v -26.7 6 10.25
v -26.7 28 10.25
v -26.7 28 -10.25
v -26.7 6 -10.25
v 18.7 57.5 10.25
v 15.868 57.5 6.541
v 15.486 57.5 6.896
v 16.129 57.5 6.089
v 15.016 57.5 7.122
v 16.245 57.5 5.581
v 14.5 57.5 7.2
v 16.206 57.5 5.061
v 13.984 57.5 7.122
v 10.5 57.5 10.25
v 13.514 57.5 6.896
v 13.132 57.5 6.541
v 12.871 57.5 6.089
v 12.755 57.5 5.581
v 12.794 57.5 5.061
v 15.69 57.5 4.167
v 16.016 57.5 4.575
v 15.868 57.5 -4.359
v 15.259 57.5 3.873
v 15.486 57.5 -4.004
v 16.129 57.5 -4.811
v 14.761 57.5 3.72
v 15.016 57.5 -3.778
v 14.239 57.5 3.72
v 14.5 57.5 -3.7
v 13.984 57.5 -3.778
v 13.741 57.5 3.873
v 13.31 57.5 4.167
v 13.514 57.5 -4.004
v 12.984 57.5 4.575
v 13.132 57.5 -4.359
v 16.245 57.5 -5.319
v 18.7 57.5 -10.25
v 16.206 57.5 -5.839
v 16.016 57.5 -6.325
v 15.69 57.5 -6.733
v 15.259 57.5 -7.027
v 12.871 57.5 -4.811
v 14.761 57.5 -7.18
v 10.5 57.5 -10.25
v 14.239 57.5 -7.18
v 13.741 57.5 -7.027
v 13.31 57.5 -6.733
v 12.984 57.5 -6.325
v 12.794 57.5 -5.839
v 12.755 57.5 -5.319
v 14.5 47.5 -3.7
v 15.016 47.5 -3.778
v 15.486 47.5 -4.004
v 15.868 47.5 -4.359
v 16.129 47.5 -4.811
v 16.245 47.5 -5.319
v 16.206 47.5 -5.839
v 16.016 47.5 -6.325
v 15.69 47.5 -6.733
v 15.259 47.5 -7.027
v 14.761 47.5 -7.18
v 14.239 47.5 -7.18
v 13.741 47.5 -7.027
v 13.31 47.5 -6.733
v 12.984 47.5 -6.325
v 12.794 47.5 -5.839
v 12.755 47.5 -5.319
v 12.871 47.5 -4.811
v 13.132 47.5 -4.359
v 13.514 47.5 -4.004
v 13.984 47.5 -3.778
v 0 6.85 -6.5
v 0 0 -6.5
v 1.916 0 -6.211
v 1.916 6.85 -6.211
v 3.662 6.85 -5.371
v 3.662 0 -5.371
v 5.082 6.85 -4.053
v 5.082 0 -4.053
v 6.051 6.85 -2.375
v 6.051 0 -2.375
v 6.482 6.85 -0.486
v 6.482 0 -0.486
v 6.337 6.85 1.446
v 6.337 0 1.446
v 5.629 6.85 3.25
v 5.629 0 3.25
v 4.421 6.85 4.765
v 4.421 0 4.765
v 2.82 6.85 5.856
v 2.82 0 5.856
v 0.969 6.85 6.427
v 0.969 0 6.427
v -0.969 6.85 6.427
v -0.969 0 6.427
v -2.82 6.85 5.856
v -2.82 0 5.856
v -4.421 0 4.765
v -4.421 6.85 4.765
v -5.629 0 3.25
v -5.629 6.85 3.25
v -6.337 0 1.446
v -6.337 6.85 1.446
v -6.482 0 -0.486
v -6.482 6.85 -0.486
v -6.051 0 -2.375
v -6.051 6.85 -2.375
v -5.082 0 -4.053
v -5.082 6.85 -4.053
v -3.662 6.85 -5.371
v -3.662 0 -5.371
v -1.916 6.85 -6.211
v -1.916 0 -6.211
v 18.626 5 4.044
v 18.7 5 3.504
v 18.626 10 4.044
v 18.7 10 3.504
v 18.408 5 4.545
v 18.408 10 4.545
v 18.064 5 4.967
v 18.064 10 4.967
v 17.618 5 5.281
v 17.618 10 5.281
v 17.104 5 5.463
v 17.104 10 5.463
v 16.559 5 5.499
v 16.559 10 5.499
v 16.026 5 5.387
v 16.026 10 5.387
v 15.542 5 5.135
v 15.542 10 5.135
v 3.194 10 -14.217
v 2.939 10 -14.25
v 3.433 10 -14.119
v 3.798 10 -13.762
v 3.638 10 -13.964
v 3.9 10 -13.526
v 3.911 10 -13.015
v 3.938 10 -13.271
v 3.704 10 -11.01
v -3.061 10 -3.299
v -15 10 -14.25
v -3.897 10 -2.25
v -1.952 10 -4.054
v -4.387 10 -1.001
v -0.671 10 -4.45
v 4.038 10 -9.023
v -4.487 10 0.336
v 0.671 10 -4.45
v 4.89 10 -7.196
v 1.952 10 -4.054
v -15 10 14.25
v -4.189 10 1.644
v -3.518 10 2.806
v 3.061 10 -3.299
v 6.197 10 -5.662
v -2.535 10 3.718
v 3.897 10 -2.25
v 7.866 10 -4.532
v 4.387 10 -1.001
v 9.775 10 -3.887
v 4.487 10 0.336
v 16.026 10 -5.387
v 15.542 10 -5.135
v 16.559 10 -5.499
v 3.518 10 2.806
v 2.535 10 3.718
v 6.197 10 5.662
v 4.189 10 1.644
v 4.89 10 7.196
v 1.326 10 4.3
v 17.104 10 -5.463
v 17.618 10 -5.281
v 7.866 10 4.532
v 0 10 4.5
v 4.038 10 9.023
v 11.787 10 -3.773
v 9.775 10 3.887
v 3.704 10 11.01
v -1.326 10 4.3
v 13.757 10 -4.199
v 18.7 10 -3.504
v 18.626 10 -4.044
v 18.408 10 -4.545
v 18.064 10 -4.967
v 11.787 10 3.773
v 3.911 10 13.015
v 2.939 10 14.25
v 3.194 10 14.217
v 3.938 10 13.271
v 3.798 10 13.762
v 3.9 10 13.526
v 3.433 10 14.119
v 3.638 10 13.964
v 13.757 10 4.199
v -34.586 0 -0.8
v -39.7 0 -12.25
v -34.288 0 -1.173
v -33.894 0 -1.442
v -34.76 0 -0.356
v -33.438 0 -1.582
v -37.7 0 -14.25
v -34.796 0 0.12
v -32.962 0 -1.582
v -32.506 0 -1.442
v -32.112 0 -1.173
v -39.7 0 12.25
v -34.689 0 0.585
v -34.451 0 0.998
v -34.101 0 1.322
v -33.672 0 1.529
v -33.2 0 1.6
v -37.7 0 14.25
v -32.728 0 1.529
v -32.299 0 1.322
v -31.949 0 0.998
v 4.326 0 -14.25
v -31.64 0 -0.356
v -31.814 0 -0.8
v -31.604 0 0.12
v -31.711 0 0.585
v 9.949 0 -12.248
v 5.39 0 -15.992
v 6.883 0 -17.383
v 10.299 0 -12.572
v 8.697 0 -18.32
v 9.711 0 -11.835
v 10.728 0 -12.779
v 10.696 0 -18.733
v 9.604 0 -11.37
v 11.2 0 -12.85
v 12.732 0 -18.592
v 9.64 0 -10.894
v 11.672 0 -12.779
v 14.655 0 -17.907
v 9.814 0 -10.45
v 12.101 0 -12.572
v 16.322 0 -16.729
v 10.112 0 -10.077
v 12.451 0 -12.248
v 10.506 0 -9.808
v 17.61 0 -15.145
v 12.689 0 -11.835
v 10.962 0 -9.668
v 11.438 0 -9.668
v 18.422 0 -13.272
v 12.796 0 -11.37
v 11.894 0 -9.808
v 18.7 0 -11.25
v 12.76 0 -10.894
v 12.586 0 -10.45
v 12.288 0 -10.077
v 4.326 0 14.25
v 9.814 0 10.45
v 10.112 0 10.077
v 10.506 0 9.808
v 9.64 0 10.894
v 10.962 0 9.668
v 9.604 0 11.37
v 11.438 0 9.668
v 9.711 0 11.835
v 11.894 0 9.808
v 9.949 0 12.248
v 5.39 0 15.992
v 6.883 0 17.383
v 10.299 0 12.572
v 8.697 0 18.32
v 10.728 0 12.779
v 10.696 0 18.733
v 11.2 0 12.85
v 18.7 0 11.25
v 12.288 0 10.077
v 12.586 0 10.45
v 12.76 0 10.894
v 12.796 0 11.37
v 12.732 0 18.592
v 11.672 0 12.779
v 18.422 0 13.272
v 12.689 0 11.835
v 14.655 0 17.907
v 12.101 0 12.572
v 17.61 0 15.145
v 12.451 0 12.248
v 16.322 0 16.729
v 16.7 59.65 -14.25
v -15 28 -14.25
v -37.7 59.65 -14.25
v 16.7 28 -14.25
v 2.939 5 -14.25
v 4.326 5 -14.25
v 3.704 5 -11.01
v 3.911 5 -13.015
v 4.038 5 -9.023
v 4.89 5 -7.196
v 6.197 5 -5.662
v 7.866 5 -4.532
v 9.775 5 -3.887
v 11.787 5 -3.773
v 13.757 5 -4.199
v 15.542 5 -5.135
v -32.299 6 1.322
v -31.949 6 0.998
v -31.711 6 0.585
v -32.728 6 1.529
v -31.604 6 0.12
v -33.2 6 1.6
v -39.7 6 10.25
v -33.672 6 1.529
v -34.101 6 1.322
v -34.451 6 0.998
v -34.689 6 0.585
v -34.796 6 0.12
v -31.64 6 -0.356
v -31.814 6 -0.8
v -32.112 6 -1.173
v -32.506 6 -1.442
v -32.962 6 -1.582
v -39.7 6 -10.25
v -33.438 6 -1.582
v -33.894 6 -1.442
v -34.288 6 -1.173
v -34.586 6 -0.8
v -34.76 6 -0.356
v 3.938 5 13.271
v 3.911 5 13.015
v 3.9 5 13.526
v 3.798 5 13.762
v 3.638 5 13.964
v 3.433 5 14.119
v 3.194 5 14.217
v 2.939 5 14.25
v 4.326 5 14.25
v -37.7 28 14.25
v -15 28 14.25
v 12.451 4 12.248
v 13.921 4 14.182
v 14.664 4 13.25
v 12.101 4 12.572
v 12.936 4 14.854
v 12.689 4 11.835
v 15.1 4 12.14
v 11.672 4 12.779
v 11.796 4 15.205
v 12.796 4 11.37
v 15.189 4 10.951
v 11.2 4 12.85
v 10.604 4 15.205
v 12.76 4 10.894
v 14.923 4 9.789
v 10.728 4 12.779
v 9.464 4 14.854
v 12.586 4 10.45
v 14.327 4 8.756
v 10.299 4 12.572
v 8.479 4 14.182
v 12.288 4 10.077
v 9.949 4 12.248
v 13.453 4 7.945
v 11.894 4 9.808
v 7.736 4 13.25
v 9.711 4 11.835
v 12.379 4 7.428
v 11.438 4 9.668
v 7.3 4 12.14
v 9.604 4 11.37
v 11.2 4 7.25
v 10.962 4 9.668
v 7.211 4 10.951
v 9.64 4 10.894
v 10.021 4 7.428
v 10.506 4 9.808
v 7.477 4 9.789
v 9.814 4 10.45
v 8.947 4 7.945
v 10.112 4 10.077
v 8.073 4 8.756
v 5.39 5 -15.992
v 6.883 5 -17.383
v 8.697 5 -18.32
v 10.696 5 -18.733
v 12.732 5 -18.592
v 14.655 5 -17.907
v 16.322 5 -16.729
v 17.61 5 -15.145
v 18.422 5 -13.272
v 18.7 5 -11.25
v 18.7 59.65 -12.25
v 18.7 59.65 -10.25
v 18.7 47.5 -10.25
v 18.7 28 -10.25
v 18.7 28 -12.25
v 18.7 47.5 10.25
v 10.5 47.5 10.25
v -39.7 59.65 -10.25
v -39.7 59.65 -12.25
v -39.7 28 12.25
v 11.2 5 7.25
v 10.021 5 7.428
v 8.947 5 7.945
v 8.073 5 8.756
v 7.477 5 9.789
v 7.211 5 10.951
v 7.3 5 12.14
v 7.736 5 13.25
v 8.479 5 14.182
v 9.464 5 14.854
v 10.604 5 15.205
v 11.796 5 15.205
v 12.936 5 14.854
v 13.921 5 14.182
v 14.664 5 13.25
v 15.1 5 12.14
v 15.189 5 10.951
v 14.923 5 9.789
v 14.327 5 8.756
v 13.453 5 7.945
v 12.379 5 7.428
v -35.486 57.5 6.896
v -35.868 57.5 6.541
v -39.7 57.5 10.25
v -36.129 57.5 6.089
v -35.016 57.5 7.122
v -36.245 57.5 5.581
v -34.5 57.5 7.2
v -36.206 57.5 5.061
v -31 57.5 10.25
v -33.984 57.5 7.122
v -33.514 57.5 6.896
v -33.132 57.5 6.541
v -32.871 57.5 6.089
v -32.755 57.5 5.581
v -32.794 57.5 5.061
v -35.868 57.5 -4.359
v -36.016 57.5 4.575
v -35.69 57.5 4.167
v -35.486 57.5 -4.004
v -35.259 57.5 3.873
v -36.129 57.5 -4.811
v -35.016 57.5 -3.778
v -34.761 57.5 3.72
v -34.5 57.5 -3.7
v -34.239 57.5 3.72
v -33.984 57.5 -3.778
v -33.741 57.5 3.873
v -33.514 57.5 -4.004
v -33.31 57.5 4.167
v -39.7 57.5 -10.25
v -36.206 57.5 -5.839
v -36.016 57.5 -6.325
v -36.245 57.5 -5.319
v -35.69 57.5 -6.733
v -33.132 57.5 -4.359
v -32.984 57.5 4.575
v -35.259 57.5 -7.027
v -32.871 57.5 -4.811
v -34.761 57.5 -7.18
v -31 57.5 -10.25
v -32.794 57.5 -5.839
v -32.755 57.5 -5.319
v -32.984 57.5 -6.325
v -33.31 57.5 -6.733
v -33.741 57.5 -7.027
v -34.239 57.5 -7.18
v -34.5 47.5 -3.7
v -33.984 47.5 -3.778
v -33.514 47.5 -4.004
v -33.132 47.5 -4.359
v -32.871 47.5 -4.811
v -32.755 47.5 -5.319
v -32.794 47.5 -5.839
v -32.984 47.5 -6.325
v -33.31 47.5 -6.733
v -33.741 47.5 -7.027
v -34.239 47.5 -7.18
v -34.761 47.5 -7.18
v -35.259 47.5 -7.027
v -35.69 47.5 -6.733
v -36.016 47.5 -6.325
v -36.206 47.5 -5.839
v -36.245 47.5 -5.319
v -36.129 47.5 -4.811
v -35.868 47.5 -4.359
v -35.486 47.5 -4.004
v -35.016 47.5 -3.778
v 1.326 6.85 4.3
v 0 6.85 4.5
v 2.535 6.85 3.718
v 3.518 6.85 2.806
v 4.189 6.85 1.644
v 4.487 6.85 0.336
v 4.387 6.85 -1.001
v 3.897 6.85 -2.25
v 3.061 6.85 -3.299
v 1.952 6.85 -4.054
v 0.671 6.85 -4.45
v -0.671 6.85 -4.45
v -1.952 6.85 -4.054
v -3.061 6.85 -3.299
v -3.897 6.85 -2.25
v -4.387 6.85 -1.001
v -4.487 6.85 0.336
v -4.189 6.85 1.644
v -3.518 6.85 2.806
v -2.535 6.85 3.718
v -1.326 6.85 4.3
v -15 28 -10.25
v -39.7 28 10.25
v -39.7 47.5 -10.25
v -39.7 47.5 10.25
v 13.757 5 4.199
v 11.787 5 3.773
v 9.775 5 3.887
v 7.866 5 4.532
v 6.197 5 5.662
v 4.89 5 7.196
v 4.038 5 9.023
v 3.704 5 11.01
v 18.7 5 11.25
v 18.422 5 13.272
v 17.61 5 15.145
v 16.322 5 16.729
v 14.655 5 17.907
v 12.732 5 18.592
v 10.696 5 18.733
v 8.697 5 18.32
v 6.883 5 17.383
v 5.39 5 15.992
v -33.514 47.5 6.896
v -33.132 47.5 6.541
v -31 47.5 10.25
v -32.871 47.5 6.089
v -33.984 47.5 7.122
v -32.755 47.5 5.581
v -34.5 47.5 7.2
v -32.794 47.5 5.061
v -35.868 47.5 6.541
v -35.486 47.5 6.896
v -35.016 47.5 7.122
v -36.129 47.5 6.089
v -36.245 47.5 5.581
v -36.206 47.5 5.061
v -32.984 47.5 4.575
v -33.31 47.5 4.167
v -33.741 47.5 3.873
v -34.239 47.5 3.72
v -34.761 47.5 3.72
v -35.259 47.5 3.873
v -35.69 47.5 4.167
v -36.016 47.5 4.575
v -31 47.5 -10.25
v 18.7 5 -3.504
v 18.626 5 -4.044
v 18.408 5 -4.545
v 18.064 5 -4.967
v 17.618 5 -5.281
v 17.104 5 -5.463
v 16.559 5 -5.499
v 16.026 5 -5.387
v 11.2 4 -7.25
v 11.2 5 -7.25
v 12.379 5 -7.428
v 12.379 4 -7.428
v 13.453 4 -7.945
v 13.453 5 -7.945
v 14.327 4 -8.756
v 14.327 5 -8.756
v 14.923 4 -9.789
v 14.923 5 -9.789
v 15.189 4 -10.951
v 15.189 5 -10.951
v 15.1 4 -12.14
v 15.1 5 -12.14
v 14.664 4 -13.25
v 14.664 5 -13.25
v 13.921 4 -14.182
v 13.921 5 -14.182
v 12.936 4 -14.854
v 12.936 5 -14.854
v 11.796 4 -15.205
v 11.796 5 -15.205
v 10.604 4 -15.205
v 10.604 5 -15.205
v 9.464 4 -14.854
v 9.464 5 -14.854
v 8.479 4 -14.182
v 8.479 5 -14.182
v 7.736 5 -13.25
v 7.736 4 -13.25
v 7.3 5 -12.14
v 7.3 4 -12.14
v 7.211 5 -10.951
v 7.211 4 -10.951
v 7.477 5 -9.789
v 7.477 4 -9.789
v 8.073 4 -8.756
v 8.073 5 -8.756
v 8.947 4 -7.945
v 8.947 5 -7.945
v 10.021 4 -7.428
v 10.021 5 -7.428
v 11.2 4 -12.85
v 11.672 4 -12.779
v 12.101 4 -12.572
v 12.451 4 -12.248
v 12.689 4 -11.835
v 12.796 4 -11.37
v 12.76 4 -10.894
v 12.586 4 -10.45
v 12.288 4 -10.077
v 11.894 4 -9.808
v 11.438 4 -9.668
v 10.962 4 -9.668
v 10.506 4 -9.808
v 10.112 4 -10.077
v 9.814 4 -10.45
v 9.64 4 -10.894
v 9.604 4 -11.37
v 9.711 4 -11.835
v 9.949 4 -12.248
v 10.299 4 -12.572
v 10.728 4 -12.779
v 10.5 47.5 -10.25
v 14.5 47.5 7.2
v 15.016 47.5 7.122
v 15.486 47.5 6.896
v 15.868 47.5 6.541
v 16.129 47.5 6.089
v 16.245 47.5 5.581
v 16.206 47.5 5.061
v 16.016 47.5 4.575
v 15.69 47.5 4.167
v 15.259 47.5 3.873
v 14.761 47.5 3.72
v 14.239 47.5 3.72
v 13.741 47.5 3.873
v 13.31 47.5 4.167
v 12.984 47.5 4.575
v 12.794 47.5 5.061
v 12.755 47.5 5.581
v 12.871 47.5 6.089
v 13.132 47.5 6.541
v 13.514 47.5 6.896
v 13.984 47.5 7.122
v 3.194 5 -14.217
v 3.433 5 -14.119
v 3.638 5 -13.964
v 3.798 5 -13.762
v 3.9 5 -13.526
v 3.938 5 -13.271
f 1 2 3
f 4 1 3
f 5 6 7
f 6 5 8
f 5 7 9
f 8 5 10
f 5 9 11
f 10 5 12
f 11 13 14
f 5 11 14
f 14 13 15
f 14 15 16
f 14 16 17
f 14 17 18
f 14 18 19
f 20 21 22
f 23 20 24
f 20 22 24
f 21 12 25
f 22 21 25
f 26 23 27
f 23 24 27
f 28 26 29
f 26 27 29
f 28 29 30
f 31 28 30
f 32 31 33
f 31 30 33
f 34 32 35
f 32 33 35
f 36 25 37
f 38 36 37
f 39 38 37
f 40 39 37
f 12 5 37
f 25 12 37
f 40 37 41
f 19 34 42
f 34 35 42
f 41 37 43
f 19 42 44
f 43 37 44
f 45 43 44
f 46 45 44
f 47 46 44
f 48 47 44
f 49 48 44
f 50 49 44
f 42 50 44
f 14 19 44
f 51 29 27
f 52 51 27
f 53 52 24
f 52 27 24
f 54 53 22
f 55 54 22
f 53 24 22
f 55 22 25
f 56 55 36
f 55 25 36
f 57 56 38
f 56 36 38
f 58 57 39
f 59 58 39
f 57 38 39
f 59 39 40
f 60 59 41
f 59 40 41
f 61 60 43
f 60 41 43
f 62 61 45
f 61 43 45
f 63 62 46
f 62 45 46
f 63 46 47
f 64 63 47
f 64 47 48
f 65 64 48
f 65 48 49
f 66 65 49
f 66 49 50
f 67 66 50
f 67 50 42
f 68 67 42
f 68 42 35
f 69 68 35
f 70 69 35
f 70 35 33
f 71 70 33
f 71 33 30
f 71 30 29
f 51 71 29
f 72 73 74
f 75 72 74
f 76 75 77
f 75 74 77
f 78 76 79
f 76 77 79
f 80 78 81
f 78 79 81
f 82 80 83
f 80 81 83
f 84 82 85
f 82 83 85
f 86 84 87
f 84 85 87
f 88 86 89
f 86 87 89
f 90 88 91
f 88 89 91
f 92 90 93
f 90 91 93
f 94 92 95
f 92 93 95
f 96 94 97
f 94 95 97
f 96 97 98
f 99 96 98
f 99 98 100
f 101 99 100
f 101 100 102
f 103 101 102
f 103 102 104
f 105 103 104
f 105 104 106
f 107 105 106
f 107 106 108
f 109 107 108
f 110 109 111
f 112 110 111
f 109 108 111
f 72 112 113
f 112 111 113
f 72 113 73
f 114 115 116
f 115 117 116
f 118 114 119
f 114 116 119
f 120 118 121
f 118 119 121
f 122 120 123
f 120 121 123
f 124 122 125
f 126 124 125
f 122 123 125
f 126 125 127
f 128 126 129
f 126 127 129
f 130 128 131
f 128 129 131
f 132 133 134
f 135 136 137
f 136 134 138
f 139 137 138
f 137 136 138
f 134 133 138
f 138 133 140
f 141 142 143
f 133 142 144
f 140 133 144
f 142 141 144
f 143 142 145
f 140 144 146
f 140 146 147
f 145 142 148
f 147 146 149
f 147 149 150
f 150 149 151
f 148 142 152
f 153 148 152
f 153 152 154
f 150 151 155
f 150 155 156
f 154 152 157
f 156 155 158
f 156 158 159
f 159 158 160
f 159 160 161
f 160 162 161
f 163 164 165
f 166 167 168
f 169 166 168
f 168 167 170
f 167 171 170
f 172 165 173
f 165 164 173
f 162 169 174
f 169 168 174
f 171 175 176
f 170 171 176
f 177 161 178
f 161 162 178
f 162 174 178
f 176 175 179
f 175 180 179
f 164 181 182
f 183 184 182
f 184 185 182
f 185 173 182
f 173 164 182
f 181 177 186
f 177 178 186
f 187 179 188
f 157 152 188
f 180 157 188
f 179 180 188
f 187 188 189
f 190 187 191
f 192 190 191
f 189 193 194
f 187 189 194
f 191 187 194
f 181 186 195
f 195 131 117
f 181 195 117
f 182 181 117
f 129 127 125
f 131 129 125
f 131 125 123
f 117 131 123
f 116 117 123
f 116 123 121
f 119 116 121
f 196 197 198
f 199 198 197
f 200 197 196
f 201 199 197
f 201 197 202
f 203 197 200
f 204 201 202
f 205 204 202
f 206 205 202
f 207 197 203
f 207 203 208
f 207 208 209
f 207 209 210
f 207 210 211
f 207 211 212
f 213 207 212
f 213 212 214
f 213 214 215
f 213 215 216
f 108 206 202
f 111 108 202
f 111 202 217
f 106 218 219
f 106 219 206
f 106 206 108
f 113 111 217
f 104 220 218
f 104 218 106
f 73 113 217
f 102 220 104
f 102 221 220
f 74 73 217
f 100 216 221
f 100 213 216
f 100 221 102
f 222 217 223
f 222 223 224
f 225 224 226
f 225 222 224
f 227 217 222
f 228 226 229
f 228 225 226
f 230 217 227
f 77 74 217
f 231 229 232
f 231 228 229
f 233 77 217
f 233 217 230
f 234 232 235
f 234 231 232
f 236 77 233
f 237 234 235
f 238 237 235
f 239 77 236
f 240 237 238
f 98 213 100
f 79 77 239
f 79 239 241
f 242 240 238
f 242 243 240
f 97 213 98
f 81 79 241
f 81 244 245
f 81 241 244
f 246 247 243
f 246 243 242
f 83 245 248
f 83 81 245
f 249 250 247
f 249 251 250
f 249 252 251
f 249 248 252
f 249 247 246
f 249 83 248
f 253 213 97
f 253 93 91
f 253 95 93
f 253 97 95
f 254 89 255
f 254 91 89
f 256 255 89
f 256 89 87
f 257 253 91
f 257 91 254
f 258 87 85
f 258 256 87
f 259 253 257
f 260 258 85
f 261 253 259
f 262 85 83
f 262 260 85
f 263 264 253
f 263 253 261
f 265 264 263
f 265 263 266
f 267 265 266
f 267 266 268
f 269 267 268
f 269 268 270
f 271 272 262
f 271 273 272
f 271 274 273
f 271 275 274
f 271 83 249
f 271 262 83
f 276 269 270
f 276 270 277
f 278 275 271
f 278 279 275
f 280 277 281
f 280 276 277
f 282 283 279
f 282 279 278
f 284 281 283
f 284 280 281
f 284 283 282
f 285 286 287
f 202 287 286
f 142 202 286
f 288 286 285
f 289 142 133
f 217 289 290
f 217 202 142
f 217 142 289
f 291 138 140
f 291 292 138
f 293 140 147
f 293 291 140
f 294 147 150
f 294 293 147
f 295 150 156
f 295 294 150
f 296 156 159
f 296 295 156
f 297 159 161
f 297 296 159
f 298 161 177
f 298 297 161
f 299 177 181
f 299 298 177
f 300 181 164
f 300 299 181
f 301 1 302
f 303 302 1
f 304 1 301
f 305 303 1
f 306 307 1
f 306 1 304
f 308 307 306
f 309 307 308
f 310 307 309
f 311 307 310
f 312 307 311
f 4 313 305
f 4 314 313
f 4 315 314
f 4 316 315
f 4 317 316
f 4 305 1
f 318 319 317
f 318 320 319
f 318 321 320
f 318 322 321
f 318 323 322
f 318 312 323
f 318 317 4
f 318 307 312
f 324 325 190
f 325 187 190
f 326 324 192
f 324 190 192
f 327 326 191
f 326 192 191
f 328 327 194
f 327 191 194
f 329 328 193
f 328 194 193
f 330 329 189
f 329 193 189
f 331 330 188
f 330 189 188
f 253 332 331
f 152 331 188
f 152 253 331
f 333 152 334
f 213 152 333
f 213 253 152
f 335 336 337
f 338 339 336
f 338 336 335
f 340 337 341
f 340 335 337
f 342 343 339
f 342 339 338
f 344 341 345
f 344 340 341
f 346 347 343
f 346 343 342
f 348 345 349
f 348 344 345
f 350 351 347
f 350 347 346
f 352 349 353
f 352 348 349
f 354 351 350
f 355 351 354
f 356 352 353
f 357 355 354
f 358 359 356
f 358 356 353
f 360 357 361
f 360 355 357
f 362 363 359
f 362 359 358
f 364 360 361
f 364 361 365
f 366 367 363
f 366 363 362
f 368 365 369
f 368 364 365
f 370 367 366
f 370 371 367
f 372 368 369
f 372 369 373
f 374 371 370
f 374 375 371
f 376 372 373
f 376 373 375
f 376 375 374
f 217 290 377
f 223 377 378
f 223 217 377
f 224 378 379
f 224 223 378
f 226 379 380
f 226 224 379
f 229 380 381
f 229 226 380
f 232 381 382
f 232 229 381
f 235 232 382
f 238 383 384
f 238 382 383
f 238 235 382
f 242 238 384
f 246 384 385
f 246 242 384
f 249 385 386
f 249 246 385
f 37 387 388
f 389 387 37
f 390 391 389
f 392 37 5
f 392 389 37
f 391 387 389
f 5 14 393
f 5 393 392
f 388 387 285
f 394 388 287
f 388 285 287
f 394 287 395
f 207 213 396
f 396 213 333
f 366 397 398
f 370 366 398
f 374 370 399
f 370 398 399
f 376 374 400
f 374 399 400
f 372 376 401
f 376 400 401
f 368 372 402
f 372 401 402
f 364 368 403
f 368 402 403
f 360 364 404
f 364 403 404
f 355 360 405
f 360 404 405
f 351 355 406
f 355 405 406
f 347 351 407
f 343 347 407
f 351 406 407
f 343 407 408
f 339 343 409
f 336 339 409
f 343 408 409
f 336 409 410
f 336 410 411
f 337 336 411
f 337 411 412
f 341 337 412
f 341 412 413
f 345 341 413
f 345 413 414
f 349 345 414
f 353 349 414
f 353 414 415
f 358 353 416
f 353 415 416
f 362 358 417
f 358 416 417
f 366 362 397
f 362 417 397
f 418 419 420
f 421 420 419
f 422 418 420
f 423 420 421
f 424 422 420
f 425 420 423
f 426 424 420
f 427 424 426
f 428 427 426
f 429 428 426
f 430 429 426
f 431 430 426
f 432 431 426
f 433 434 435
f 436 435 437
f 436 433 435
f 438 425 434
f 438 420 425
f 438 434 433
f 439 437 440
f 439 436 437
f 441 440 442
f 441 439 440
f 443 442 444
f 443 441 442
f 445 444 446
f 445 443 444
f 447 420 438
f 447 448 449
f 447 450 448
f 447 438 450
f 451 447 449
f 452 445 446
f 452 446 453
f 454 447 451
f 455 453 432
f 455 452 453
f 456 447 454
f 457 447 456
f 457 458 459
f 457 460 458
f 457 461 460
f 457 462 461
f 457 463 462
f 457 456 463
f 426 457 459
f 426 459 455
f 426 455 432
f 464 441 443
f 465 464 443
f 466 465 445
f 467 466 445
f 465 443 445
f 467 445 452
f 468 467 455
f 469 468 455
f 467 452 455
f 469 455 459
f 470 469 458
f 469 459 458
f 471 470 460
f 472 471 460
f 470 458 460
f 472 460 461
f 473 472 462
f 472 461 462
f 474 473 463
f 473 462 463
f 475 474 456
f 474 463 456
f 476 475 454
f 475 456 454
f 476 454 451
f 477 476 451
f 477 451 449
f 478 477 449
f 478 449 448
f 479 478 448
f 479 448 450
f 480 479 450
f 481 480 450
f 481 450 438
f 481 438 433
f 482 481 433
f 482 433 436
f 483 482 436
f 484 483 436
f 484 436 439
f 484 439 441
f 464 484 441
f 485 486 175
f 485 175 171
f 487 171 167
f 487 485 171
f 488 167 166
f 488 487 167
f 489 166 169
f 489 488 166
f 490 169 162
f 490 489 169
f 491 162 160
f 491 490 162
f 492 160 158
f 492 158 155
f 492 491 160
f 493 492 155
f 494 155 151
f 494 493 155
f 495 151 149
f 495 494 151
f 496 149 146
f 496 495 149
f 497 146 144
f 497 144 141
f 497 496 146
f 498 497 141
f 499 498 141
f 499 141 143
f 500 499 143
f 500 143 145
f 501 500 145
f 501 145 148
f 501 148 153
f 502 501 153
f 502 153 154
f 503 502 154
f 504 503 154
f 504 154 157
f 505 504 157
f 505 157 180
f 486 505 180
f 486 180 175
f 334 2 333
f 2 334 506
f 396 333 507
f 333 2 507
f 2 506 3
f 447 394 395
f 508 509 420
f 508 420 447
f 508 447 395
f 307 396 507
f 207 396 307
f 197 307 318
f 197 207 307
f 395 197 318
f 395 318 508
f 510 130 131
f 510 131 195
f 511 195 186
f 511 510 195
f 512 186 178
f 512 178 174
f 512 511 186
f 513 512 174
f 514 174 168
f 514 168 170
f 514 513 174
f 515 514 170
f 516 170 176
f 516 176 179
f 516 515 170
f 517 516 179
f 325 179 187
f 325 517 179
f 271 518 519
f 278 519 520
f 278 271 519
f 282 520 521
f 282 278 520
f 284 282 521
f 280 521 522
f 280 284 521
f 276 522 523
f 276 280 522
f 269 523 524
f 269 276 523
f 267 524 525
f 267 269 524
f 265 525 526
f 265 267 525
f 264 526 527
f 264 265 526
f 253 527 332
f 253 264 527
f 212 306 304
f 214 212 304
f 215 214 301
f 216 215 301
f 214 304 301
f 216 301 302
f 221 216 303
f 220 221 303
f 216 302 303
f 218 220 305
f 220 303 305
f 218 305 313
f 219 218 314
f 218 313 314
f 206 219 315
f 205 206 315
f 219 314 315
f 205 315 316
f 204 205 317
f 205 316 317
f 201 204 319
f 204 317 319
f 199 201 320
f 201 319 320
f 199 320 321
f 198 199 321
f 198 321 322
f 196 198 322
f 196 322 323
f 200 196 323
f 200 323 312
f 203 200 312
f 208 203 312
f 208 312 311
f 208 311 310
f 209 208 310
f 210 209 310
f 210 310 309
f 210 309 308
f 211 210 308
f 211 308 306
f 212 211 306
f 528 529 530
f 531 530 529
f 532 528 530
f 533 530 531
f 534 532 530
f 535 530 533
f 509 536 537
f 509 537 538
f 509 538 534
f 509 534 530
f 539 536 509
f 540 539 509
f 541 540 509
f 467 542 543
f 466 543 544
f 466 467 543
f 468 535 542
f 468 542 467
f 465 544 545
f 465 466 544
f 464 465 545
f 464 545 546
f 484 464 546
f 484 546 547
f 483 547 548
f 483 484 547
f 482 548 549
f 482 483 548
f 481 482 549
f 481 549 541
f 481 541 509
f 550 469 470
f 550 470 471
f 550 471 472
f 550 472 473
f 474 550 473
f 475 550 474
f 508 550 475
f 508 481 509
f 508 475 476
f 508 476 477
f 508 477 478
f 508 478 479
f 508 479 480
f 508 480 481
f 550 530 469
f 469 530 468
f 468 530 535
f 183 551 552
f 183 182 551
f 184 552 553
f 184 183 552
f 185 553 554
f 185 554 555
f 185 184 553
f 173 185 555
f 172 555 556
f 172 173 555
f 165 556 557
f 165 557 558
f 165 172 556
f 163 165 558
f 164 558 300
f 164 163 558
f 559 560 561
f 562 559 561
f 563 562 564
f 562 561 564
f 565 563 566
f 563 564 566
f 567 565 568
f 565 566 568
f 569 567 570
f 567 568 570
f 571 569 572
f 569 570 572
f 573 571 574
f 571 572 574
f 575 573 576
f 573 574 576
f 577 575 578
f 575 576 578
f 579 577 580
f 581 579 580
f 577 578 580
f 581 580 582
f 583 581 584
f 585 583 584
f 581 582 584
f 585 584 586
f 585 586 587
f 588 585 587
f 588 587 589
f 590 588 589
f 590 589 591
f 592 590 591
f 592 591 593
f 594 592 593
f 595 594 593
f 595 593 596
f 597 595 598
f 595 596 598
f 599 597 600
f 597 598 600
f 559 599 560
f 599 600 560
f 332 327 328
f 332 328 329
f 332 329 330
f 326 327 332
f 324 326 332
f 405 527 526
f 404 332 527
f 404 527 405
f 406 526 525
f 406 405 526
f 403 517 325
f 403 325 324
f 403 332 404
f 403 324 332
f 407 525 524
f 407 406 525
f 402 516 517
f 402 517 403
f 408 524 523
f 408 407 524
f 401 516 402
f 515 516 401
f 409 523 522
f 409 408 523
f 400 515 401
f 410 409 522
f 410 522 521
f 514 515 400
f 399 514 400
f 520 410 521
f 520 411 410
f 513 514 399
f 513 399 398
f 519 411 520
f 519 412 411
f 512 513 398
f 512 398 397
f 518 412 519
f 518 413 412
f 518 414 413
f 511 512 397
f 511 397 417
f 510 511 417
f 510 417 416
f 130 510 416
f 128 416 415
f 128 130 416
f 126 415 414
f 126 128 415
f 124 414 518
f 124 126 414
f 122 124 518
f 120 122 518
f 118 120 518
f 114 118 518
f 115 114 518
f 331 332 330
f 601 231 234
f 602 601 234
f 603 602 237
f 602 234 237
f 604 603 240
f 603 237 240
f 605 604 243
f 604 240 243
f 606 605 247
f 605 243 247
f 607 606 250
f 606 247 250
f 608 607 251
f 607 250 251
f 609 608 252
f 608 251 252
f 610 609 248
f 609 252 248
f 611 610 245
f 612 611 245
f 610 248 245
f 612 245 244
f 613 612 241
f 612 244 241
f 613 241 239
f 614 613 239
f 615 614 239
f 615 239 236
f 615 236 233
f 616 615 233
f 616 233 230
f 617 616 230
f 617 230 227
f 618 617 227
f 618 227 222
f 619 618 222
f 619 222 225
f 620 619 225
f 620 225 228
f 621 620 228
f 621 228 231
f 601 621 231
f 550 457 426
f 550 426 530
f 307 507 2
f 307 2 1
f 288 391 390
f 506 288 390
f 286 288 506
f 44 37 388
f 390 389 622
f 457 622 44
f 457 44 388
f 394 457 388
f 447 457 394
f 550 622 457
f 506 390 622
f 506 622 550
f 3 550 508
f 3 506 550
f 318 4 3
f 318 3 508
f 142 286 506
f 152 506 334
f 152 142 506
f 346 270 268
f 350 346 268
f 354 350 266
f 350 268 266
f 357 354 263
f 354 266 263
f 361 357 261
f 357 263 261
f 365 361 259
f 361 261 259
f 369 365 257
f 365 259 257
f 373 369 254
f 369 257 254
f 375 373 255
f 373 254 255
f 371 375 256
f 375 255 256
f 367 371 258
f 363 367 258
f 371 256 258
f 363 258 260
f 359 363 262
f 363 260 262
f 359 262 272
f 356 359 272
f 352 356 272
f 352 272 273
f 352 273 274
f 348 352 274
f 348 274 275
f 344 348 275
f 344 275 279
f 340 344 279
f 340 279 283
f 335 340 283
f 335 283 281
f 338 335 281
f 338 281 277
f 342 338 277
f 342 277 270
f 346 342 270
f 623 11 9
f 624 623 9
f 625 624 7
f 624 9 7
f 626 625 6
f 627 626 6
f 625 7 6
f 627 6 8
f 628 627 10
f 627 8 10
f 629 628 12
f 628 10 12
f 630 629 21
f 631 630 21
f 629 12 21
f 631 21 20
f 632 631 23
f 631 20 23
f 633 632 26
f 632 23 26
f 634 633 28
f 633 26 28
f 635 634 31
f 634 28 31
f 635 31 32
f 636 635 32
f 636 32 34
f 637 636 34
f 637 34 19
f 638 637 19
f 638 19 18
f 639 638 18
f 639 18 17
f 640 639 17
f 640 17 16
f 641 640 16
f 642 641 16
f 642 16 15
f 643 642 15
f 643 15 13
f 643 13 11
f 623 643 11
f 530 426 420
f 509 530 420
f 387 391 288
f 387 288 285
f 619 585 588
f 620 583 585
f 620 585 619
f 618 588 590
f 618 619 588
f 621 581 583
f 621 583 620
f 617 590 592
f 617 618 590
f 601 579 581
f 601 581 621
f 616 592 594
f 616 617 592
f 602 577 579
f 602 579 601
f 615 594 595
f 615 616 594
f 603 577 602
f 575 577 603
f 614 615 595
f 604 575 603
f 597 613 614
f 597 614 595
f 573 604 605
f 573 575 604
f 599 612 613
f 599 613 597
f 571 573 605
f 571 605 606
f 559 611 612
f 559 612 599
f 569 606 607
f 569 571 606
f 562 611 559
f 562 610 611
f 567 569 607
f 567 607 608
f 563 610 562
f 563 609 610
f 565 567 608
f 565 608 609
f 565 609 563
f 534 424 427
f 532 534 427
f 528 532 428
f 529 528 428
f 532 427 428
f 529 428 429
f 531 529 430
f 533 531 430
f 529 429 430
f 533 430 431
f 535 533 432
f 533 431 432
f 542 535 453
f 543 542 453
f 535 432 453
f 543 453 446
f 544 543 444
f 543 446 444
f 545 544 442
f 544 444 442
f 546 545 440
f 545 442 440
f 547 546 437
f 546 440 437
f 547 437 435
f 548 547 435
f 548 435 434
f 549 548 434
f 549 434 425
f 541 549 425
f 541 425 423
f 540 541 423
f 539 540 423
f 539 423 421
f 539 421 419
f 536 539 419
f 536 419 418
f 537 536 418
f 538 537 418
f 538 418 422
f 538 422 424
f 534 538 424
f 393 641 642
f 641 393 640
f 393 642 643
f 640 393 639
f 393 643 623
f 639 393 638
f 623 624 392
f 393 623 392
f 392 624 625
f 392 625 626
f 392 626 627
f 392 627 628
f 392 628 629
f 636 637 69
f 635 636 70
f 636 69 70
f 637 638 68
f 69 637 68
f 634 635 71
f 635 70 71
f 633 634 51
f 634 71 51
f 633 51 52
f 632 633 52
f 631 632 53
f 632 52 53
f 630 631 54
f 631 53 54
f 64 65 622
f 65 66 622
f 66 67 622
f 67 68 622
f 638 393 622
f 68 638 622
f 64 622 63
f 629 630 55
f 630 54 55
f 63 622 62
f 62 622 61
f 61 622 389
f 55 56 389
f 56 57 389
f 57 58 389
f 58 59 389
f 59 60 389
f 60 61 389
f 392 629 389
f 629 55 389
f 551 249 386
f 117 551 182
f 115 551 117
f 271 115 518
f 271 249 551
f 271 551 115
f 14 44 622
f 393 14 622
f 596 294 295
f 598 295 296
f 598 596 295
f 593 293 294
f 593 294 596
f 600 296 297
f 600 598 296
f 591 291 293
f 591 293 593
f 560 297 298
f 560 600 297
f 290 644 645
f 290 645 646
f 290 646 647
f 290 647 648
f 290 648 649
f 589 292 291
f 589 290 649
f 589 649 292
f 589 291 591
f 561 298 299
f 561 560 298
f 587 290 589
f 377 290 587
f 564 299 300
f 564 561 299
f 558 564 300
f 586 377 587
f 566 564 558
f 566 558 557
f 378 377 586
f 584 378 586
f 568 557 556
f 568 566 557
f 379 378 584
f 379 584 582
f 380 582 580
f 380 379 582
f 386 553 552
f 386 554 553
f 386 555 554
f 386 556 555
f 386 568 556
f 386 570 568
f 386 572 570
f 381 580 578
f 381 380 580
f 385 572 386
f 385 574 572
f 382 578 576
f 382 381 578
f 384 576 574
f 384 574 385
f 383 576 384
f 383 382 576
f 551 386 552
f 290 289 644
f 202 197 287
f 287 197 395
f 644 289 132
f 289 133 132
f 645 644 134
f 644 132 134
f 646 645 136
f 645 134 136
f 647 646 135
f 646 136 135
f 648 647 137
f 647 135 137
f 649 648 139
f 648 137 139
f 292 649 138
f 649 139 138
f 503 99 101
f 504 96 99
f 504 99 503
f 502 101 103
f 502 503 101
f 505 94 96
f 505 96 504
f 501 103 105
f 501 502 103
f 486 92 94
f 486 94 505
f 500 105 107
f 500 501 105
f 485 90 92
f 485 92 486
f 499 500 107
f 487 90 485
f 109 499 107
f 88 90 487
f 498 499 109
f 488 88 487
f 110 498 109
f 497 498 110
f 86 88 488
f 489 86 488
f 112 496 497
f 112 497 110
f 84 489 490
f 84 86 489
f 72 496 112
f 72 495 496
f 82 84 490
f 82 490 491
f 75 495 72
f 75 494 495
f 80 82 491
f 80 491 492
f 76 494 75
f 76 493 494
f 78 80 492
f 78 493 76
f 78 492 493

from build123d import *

# Parameters (mm, degrees)
SZKIC1_R                    = 4.5
DODANIE_WYCI_GNI_CIE1_DEPTH = 10
SZKIC3_R                    = 6.5
WYTNIJ_WYCI_GNI_CIE9_DEPTH  = 6.85
DODANIE_WYCI_GNI_CIE2_DEPTH = 18
DODANIE_WYCI_GNI_CIE3_DEPTH = 31.65
DODANIE_WYCI_GNI_CIE4_DEPTH = 20.5
WYTNIJ_WYCI_GNI_CIE3_REACH  = 73.312
SZKIC8_R                    = 1.7500000000000036
SZKIC8_R_2                  = 1.7499999999999982
SFAZOWANIE1_SIZE            = 2
DODANIE_WYCI_GNI_CIE5_DEPTH = 10
WYTNIJ_WYCI_GNI_CIE4_REACH  = 76.066
SZKIC12_R                   = 1.6000000000000019
WYTNIJ_WYCI_GNI_CIE6_START  = -5
SZKIC14_R                   = 7.499999999999999
WYTNIJ_WYCI_GNI_CIE6_DEPTH  = 5
SZKIC13_R                   = 4.000000000000001
WYTNIJ_WYCI_GNI_CIE5_DEPTH  = 1
ZAOKR_GLENIE1_R             = 2
ZAOKR_GLENIE2_R             = 1
WYTNIJ_WYCI_GNI_CIE7_DEPTH  = 13
WYTNIJ_WYCI_GNI_CIE8_REACH  = 71.325
SZKIC16_R                   = 1.599999999999998


with BuildPart() as part:
    # Szkic1 → Dodanie-wyciągnięcie1 (new body)
    with BuildSketch(Plane(origin=(0, 0, 0), x_dir=(1, 0, 0), z_dir=(0, 1, 0))):
        Polygon((-39.699999999999996, 14.25), (11.950000000000069, 14.25), (18.7, 7.5), (18.7, -7.5), (11.95000000000007, -14.25), (-39.699999999999996, -14.25), align=None)
        with Locations(Location((0, 0, 0), (0, 0, 270))):
            Circle(SZKIC1_R, mode=Mode.SUBTRACT)
    extrude(amount=DODANIE_WYCI_GNI_CIE1_DEPTH)

    # Szkic3 → Wytnij-wyciągnięcie9 (cut)
    with BuildSketch(Plane.XZ):
        with Locations(Location((0, 0, 0), (0, 0, 270))):
            Circle(SZKIC3_R)
    extrude(amount=-WYTNIJ_WYCI_GNI_CIE9_DEPTH, mode=Mode.SUBTRACT)

    # Szkic4 → Dodanie-wyciągnięcie2 (add)
    with BuildSketch(Plane(origin=(0, 10, 0), x_dir=(1, 0, 0), z_dir=(0, 1, 0))):
        Polygon((-39.699999999999996, 14.25), (-15, 14.25), (-14.999999999999996, -14.25), (-39.699999999999996, -14.25), align=None)
    extrude(amount=DODANIE_WYCI_GNI_CIE2_DEPTH)

    # Szkic6 → Dodanie-wyciągnięcie3 (add)
    with BuildSketch(Plane(origin=(0, 27.999999999999996, 0), x_dir=(1, 0, 0), z_dir=(0, 1, 0))):
        Polygon((-39.699999999999996, 14.25), (18.699999999999996, 14.25), (18.7, 10.25), (-39.699999999999996, 10.25), align=None)
    extrude(amount=DODANIE_WYCI_GNI_CIE3_DEPTH)

    # Szkic7 → Dodanie-wyciągnięcie4 (add)
    with BuildSketch(Plane.XY.offset(-10.25)):
        Polygon((18.7, 57.49999999999999), (10.499999999999995, 57.49999999999999), (10.499999999999996, 47.49999999999999), (18.7, 47.49999999999999), align=None)
        Polygon((-39.699999999999996, 57.499999999999986), (-31.000000000000007, 57.499999999999986), (-31.000000000000004, 47.499999999999986), (-39.699999999999996, 47.499999999999986), align=None)
    extrude(amount=DODANIE_WYCI_GNI_CIE4_DEPTH)

    # Szkic8 → Wytnij-wyciągnięcie3 (cut, up to next)
    with BuildSketch(Plane(origin=(0, 57.499999999999986, 0), x_dir=(1, 0, 0), z_dir=(0, 1, 0)), mode=Mode.PRIVATE) as wytnij_wyci_gni_cie3_sk1:
        with Locations(Location((-34.5, 5.450000000000001, 0), (0, 0, 270))):
            Circle(SZKIC8_R)
    wytnij_wyci_gni_cie3_tool1 = extrude(wytnij_wyci_gni_cie3_sk1.sketch, amount=-WYTNIJ_WYCI_GNI_CIE3_REACH, mode=Mode.PRIVATE) & part.part
    # Szkic8 → Wytnij-wyciągnięcie3 (cut, up to next)
    with BuildSketch(Plane(origin=(0, 57.499999999999986, 0), x_dir=(1, 0, 0), z_dir=(0, 1, 0)), mode=Mode.PRIVATE) as wytnij_wyci_gni_cie3_sk2:
        with Locations(Location((14.5, 5.450000000000002, 0), (0, 0, 270))):
            Circle(SZKIC8_R_2)
    wytnij_wyci_gni_cie3_tool2 = extrude(wytnij_wyci_gni_cie3_sk2.sketch, amount=-WYTNIJ_WYCI_GNI_CIE3_REACH, mode=Mode.PRIVATE) & part.part
    # Szkic8 → Wytnij-wyciągnięcie3 (cut, up to next)
    with BuildSketch(Plane(origin=(0, 57.499999999999986, 0), x_dir=(1, 0, 0), z_dir=(0, 1, 0)), mode=Mode.PRIVATE) as wytnij_wyci_gni_cie3_sk3:
        with Locations(Location((14.5, -5.450000000000002, 0), (0, 0, 270))):
            Circle(SZKIC8_R_2)
    wytnij_wyci_gni_cie3_tool3 = extrude(wytnij_wyci_gni_cie3_sk3.sketch, amount=-WYTNIJ_WYCI_GNI_CIE3_REACH, mode=Mode.PRIVATE) & part.part
    # Szkic8 → Wytnij-wyciągnięcie3 (cut, up to next)
    with BuildSketch(Plane(origin=(0, 57.499999999999986, 0), x_dir=(1, 0, 0), z_dir=(0, 1, 0)), mode=Mode.PRIVATE) as wytnij_wyci_gni_cie3_sk4:
        with Locations(Location((-34.5, -5.450000000000001, 0), (0, 0, 270))):
            Circle(SZKIC8_R)
    wytnij_wyci_gni_cie3_tool4 = extrude(wytnij_wyci_gni_cie3_sk4.sketch, amount=-WYTNIJ_WYCI_GNI_CIE3_REACH, mode=Mode.PRIVATE) & part.part
    add(wytnij_wyci_gni_cie3_tool1.solids().sort_by_distance((-34.5, 57.5, -5.45))[0], mode=Mode.SUBTRACT)
    add(wytnij_wyci_gni_cie3_tool2.solids().sort_by_distance((14.5, 57.5, -5.45))[0], mode=Mode.SUBTRACT)
    add(wytnij_wyci_gni_cie3_tool3.solids().sort_by_distance((14.5, 57.5, 5.45))[0], mode=Mode.SUBTRACT)
    add(wytnij_wyci_gni_cie3_tool4.solids().sort_by_distance((-34.5, 57.5, 5.45))[0], mode=Mode.SUBTRACT)

    # Sfazowanie1
    sfazowanie1_edges = [part.edges().sort_by_distance(p)[0] for p in [
        (-39.699999999999996, 29.824999999999996, -14.25),
        (-39.699999999999996, 14, 14.25),
        (18.699999999999996, 43.824999999999996, -14.25),
    ]]
    chamfer(sfazowanie1_edges, length=SFAZOWANIE1_SIZE)

    # Szkic9 → Dodanie-wyciągnięcie5 (add)
    with BuildSketch(Plane.XZ):
        with BuildLine():
            Line((18.7, -7.5), (11.950000000000069, -14.25))
            Line((11.950000000000069, -14.25), (4.326136457566238, -14.249999999999998))
            ThreePointArc((4.326136457566238, -14.249999999999998), (12.732322327669147, -18.59179734698027), (18.7, -11.25))
            Line((18.7, -11.25), (18.7, -7.5))
        make_face()
        with BuildLine():
            Line((18.7, 7.5), (18.7, 11.25))
            ThreePointArc((18.7, 11.25), (12.732322327669147, 18.59179734698027), (4.326136457566238, 14.249999999999998))
            Line((4.326136457566238, 14.249999999999998), (11.950000000000069, 14.25))
            Line((11.950000000000069, 14.25), (18.7, 7.5))
        make_face()
    extrude(amount=-DODANIE_WYCI_GNI_CIE5_DEPTH)

    # Szkic12 → Wytnij-wyciągnięcie4 (cut, up to next)
    with BuildSketch(Plane.XZ, mode=Mode.PRIVATE) as wytnij_wyci_gni_cie4_sk1:
        with Locations(Location((11.199999999999998, -11.25, 0), (0, 0, 270))):
            Circle(SZKIC12_R)
    wytnij_wyci_gni_cie4_tool1 = extrude(wytnij_wyci_gni_cie4_sk1.sketch, amount=-WYTNIJ_WYCI_GNI_CIE4_REACH, mode=Mode.PRIVATE) & part.part
    # Szkic12 → Wytnij-wyciągnięcie4 (cut, up to next)
    with BuildSketch(Plane.XZ, mode=Mode.PRIVATE) as wytnij_wyci_gni_cie4_sk2:
        with Locations(Location((11.199999999999998, 11.25, 0), (0, 0, 90))):
            Circle(SZKIC12_R)
    wytnij_wyci_gni_cie4_tool2 = extrude(wytnij_wyci_gni_cie4_sk2.sketch, amount=-WYTNIJ_WYCI_GNI_CIE4_REACH, mode=Mode.PRIVATE) & part.part
    add(wytnij_wyci_gni_cie4_tool1.solids().sort_by_distance((11.2, 0, -11.25))[0], mode=Mode.SUBTRACT)
    add(wytnij_wyci_gni_cie4_tool2.solids().sort_by_distance((11.2, 0, 11.25))[0], mode=Mode.SUBTRACT)

    # Szkic14 → Wytnij-wyciągnięcie6 (cut)
    with BuildSketch(Plane(origin=(0, 10, 0), x_dir=(1, 0, 0), z_dir=(0, 1, 0)).offset(WYTNIJ_WYCI_GNI_CIE6_START)):
        with Locations((11.199999999999998, -11.25)):
            Circle(SZKIC14_R)
        with Locations((11.199999999999998, 11.25)):
            Circle(SZKIC14_R)
    extrude(amount=WYTNIJ_WYCI_GNI_CIE6_DEPTH, mode=Mode.SUBTRACT)

    # Szkic13 → Wytnij-wyciągnięcie5 (cut)
    with BuildSketch(Plane(origin=(0, 5, 0), x_dir=(1, 0, 0), z_dir=(0, 1, 0))):
        with Locations(Location((11.199999999999998, 11.25, 0), (0, 0, 270))):
            Circle(SZKIC13_R)
        with Locations(Location((11.199999999999998, -11.25, 0), (0, 0, 90))):
            Circle(SZKIC13_R)
    extrude(amount=-WYTNIJ_WYCI_GNI_CIE5_DEPTH, mode=Mode.SUBTRACT)

    # Zaokrąglenie1
    zaokr_glenie1_edges = [part.edges().sort_by_distance(p)[0] for p in [
        (18.700000000000003, 7.5, 11.25),
        (18.7, 7.5, -11.25),
    ]]
    fillet(zaokr_glenie1_edges, radius=ZAOKR_GLENIE1_R - 0.0001)  # a hair under: the kernel refuses the full size

    # Zaokrąglenie2
    zaokr_glenie2_edges = [part.edges().sort_by_distance(p)[0] for p in [
        (4.326136457566238, 7.5, 14.25),
        (4.326136457566238, 7.5, -14.249999999999998),
    ]]
    fillet(zaokr_glenie2_edges, radius=ZAOKR_GLENIE2_R)

    # Szkic15 → Wytnij-wyciągnięcie7 (cut)
    with BuildSketch(Plane.ZY.offset(39.699999999999996)):
        Polygon((-10.25, 27.999999999999996), (10.25, 27.999999999999996), (10.250000000000002, 6), (-10.25, 6), align=None)
    extrude(amount=-WYTNIJ_WYCI_GNI_CIE7_DEPTH, mode=Mode.SUBTRACT)

    # Szkic16 → Wytnij-wyciągnięcie8 (cut, up to next)
    with BuildSketch(Plane(origin=(0, 6, 0), x_dir=(1, 0, 0), z_dir=(0, 1, 0)), mode=Mode.PRIVATE) as wytnij_wyci_gni_cie8_sk1:
        with Locations(Location((-33.2, 0, 0), (0, 0, 270))):
            Circle(SZKIC16_R)
    wytnij_wyci_gni_cie8_tool1 = extrude(wytnij_wyci_gni_cie8_sk1.sketch, amount=-WYTNIJ_WYCI_GNI_CIE8_REACH, mode=Mode.PRIVATE) & part.part
    add(wytnij_wyci_gni_cie8_tool1.solids().sort_by_distance((-33.2, 6, 0))[0], mode=Mode.SUBTRACT)


solid = part.part
